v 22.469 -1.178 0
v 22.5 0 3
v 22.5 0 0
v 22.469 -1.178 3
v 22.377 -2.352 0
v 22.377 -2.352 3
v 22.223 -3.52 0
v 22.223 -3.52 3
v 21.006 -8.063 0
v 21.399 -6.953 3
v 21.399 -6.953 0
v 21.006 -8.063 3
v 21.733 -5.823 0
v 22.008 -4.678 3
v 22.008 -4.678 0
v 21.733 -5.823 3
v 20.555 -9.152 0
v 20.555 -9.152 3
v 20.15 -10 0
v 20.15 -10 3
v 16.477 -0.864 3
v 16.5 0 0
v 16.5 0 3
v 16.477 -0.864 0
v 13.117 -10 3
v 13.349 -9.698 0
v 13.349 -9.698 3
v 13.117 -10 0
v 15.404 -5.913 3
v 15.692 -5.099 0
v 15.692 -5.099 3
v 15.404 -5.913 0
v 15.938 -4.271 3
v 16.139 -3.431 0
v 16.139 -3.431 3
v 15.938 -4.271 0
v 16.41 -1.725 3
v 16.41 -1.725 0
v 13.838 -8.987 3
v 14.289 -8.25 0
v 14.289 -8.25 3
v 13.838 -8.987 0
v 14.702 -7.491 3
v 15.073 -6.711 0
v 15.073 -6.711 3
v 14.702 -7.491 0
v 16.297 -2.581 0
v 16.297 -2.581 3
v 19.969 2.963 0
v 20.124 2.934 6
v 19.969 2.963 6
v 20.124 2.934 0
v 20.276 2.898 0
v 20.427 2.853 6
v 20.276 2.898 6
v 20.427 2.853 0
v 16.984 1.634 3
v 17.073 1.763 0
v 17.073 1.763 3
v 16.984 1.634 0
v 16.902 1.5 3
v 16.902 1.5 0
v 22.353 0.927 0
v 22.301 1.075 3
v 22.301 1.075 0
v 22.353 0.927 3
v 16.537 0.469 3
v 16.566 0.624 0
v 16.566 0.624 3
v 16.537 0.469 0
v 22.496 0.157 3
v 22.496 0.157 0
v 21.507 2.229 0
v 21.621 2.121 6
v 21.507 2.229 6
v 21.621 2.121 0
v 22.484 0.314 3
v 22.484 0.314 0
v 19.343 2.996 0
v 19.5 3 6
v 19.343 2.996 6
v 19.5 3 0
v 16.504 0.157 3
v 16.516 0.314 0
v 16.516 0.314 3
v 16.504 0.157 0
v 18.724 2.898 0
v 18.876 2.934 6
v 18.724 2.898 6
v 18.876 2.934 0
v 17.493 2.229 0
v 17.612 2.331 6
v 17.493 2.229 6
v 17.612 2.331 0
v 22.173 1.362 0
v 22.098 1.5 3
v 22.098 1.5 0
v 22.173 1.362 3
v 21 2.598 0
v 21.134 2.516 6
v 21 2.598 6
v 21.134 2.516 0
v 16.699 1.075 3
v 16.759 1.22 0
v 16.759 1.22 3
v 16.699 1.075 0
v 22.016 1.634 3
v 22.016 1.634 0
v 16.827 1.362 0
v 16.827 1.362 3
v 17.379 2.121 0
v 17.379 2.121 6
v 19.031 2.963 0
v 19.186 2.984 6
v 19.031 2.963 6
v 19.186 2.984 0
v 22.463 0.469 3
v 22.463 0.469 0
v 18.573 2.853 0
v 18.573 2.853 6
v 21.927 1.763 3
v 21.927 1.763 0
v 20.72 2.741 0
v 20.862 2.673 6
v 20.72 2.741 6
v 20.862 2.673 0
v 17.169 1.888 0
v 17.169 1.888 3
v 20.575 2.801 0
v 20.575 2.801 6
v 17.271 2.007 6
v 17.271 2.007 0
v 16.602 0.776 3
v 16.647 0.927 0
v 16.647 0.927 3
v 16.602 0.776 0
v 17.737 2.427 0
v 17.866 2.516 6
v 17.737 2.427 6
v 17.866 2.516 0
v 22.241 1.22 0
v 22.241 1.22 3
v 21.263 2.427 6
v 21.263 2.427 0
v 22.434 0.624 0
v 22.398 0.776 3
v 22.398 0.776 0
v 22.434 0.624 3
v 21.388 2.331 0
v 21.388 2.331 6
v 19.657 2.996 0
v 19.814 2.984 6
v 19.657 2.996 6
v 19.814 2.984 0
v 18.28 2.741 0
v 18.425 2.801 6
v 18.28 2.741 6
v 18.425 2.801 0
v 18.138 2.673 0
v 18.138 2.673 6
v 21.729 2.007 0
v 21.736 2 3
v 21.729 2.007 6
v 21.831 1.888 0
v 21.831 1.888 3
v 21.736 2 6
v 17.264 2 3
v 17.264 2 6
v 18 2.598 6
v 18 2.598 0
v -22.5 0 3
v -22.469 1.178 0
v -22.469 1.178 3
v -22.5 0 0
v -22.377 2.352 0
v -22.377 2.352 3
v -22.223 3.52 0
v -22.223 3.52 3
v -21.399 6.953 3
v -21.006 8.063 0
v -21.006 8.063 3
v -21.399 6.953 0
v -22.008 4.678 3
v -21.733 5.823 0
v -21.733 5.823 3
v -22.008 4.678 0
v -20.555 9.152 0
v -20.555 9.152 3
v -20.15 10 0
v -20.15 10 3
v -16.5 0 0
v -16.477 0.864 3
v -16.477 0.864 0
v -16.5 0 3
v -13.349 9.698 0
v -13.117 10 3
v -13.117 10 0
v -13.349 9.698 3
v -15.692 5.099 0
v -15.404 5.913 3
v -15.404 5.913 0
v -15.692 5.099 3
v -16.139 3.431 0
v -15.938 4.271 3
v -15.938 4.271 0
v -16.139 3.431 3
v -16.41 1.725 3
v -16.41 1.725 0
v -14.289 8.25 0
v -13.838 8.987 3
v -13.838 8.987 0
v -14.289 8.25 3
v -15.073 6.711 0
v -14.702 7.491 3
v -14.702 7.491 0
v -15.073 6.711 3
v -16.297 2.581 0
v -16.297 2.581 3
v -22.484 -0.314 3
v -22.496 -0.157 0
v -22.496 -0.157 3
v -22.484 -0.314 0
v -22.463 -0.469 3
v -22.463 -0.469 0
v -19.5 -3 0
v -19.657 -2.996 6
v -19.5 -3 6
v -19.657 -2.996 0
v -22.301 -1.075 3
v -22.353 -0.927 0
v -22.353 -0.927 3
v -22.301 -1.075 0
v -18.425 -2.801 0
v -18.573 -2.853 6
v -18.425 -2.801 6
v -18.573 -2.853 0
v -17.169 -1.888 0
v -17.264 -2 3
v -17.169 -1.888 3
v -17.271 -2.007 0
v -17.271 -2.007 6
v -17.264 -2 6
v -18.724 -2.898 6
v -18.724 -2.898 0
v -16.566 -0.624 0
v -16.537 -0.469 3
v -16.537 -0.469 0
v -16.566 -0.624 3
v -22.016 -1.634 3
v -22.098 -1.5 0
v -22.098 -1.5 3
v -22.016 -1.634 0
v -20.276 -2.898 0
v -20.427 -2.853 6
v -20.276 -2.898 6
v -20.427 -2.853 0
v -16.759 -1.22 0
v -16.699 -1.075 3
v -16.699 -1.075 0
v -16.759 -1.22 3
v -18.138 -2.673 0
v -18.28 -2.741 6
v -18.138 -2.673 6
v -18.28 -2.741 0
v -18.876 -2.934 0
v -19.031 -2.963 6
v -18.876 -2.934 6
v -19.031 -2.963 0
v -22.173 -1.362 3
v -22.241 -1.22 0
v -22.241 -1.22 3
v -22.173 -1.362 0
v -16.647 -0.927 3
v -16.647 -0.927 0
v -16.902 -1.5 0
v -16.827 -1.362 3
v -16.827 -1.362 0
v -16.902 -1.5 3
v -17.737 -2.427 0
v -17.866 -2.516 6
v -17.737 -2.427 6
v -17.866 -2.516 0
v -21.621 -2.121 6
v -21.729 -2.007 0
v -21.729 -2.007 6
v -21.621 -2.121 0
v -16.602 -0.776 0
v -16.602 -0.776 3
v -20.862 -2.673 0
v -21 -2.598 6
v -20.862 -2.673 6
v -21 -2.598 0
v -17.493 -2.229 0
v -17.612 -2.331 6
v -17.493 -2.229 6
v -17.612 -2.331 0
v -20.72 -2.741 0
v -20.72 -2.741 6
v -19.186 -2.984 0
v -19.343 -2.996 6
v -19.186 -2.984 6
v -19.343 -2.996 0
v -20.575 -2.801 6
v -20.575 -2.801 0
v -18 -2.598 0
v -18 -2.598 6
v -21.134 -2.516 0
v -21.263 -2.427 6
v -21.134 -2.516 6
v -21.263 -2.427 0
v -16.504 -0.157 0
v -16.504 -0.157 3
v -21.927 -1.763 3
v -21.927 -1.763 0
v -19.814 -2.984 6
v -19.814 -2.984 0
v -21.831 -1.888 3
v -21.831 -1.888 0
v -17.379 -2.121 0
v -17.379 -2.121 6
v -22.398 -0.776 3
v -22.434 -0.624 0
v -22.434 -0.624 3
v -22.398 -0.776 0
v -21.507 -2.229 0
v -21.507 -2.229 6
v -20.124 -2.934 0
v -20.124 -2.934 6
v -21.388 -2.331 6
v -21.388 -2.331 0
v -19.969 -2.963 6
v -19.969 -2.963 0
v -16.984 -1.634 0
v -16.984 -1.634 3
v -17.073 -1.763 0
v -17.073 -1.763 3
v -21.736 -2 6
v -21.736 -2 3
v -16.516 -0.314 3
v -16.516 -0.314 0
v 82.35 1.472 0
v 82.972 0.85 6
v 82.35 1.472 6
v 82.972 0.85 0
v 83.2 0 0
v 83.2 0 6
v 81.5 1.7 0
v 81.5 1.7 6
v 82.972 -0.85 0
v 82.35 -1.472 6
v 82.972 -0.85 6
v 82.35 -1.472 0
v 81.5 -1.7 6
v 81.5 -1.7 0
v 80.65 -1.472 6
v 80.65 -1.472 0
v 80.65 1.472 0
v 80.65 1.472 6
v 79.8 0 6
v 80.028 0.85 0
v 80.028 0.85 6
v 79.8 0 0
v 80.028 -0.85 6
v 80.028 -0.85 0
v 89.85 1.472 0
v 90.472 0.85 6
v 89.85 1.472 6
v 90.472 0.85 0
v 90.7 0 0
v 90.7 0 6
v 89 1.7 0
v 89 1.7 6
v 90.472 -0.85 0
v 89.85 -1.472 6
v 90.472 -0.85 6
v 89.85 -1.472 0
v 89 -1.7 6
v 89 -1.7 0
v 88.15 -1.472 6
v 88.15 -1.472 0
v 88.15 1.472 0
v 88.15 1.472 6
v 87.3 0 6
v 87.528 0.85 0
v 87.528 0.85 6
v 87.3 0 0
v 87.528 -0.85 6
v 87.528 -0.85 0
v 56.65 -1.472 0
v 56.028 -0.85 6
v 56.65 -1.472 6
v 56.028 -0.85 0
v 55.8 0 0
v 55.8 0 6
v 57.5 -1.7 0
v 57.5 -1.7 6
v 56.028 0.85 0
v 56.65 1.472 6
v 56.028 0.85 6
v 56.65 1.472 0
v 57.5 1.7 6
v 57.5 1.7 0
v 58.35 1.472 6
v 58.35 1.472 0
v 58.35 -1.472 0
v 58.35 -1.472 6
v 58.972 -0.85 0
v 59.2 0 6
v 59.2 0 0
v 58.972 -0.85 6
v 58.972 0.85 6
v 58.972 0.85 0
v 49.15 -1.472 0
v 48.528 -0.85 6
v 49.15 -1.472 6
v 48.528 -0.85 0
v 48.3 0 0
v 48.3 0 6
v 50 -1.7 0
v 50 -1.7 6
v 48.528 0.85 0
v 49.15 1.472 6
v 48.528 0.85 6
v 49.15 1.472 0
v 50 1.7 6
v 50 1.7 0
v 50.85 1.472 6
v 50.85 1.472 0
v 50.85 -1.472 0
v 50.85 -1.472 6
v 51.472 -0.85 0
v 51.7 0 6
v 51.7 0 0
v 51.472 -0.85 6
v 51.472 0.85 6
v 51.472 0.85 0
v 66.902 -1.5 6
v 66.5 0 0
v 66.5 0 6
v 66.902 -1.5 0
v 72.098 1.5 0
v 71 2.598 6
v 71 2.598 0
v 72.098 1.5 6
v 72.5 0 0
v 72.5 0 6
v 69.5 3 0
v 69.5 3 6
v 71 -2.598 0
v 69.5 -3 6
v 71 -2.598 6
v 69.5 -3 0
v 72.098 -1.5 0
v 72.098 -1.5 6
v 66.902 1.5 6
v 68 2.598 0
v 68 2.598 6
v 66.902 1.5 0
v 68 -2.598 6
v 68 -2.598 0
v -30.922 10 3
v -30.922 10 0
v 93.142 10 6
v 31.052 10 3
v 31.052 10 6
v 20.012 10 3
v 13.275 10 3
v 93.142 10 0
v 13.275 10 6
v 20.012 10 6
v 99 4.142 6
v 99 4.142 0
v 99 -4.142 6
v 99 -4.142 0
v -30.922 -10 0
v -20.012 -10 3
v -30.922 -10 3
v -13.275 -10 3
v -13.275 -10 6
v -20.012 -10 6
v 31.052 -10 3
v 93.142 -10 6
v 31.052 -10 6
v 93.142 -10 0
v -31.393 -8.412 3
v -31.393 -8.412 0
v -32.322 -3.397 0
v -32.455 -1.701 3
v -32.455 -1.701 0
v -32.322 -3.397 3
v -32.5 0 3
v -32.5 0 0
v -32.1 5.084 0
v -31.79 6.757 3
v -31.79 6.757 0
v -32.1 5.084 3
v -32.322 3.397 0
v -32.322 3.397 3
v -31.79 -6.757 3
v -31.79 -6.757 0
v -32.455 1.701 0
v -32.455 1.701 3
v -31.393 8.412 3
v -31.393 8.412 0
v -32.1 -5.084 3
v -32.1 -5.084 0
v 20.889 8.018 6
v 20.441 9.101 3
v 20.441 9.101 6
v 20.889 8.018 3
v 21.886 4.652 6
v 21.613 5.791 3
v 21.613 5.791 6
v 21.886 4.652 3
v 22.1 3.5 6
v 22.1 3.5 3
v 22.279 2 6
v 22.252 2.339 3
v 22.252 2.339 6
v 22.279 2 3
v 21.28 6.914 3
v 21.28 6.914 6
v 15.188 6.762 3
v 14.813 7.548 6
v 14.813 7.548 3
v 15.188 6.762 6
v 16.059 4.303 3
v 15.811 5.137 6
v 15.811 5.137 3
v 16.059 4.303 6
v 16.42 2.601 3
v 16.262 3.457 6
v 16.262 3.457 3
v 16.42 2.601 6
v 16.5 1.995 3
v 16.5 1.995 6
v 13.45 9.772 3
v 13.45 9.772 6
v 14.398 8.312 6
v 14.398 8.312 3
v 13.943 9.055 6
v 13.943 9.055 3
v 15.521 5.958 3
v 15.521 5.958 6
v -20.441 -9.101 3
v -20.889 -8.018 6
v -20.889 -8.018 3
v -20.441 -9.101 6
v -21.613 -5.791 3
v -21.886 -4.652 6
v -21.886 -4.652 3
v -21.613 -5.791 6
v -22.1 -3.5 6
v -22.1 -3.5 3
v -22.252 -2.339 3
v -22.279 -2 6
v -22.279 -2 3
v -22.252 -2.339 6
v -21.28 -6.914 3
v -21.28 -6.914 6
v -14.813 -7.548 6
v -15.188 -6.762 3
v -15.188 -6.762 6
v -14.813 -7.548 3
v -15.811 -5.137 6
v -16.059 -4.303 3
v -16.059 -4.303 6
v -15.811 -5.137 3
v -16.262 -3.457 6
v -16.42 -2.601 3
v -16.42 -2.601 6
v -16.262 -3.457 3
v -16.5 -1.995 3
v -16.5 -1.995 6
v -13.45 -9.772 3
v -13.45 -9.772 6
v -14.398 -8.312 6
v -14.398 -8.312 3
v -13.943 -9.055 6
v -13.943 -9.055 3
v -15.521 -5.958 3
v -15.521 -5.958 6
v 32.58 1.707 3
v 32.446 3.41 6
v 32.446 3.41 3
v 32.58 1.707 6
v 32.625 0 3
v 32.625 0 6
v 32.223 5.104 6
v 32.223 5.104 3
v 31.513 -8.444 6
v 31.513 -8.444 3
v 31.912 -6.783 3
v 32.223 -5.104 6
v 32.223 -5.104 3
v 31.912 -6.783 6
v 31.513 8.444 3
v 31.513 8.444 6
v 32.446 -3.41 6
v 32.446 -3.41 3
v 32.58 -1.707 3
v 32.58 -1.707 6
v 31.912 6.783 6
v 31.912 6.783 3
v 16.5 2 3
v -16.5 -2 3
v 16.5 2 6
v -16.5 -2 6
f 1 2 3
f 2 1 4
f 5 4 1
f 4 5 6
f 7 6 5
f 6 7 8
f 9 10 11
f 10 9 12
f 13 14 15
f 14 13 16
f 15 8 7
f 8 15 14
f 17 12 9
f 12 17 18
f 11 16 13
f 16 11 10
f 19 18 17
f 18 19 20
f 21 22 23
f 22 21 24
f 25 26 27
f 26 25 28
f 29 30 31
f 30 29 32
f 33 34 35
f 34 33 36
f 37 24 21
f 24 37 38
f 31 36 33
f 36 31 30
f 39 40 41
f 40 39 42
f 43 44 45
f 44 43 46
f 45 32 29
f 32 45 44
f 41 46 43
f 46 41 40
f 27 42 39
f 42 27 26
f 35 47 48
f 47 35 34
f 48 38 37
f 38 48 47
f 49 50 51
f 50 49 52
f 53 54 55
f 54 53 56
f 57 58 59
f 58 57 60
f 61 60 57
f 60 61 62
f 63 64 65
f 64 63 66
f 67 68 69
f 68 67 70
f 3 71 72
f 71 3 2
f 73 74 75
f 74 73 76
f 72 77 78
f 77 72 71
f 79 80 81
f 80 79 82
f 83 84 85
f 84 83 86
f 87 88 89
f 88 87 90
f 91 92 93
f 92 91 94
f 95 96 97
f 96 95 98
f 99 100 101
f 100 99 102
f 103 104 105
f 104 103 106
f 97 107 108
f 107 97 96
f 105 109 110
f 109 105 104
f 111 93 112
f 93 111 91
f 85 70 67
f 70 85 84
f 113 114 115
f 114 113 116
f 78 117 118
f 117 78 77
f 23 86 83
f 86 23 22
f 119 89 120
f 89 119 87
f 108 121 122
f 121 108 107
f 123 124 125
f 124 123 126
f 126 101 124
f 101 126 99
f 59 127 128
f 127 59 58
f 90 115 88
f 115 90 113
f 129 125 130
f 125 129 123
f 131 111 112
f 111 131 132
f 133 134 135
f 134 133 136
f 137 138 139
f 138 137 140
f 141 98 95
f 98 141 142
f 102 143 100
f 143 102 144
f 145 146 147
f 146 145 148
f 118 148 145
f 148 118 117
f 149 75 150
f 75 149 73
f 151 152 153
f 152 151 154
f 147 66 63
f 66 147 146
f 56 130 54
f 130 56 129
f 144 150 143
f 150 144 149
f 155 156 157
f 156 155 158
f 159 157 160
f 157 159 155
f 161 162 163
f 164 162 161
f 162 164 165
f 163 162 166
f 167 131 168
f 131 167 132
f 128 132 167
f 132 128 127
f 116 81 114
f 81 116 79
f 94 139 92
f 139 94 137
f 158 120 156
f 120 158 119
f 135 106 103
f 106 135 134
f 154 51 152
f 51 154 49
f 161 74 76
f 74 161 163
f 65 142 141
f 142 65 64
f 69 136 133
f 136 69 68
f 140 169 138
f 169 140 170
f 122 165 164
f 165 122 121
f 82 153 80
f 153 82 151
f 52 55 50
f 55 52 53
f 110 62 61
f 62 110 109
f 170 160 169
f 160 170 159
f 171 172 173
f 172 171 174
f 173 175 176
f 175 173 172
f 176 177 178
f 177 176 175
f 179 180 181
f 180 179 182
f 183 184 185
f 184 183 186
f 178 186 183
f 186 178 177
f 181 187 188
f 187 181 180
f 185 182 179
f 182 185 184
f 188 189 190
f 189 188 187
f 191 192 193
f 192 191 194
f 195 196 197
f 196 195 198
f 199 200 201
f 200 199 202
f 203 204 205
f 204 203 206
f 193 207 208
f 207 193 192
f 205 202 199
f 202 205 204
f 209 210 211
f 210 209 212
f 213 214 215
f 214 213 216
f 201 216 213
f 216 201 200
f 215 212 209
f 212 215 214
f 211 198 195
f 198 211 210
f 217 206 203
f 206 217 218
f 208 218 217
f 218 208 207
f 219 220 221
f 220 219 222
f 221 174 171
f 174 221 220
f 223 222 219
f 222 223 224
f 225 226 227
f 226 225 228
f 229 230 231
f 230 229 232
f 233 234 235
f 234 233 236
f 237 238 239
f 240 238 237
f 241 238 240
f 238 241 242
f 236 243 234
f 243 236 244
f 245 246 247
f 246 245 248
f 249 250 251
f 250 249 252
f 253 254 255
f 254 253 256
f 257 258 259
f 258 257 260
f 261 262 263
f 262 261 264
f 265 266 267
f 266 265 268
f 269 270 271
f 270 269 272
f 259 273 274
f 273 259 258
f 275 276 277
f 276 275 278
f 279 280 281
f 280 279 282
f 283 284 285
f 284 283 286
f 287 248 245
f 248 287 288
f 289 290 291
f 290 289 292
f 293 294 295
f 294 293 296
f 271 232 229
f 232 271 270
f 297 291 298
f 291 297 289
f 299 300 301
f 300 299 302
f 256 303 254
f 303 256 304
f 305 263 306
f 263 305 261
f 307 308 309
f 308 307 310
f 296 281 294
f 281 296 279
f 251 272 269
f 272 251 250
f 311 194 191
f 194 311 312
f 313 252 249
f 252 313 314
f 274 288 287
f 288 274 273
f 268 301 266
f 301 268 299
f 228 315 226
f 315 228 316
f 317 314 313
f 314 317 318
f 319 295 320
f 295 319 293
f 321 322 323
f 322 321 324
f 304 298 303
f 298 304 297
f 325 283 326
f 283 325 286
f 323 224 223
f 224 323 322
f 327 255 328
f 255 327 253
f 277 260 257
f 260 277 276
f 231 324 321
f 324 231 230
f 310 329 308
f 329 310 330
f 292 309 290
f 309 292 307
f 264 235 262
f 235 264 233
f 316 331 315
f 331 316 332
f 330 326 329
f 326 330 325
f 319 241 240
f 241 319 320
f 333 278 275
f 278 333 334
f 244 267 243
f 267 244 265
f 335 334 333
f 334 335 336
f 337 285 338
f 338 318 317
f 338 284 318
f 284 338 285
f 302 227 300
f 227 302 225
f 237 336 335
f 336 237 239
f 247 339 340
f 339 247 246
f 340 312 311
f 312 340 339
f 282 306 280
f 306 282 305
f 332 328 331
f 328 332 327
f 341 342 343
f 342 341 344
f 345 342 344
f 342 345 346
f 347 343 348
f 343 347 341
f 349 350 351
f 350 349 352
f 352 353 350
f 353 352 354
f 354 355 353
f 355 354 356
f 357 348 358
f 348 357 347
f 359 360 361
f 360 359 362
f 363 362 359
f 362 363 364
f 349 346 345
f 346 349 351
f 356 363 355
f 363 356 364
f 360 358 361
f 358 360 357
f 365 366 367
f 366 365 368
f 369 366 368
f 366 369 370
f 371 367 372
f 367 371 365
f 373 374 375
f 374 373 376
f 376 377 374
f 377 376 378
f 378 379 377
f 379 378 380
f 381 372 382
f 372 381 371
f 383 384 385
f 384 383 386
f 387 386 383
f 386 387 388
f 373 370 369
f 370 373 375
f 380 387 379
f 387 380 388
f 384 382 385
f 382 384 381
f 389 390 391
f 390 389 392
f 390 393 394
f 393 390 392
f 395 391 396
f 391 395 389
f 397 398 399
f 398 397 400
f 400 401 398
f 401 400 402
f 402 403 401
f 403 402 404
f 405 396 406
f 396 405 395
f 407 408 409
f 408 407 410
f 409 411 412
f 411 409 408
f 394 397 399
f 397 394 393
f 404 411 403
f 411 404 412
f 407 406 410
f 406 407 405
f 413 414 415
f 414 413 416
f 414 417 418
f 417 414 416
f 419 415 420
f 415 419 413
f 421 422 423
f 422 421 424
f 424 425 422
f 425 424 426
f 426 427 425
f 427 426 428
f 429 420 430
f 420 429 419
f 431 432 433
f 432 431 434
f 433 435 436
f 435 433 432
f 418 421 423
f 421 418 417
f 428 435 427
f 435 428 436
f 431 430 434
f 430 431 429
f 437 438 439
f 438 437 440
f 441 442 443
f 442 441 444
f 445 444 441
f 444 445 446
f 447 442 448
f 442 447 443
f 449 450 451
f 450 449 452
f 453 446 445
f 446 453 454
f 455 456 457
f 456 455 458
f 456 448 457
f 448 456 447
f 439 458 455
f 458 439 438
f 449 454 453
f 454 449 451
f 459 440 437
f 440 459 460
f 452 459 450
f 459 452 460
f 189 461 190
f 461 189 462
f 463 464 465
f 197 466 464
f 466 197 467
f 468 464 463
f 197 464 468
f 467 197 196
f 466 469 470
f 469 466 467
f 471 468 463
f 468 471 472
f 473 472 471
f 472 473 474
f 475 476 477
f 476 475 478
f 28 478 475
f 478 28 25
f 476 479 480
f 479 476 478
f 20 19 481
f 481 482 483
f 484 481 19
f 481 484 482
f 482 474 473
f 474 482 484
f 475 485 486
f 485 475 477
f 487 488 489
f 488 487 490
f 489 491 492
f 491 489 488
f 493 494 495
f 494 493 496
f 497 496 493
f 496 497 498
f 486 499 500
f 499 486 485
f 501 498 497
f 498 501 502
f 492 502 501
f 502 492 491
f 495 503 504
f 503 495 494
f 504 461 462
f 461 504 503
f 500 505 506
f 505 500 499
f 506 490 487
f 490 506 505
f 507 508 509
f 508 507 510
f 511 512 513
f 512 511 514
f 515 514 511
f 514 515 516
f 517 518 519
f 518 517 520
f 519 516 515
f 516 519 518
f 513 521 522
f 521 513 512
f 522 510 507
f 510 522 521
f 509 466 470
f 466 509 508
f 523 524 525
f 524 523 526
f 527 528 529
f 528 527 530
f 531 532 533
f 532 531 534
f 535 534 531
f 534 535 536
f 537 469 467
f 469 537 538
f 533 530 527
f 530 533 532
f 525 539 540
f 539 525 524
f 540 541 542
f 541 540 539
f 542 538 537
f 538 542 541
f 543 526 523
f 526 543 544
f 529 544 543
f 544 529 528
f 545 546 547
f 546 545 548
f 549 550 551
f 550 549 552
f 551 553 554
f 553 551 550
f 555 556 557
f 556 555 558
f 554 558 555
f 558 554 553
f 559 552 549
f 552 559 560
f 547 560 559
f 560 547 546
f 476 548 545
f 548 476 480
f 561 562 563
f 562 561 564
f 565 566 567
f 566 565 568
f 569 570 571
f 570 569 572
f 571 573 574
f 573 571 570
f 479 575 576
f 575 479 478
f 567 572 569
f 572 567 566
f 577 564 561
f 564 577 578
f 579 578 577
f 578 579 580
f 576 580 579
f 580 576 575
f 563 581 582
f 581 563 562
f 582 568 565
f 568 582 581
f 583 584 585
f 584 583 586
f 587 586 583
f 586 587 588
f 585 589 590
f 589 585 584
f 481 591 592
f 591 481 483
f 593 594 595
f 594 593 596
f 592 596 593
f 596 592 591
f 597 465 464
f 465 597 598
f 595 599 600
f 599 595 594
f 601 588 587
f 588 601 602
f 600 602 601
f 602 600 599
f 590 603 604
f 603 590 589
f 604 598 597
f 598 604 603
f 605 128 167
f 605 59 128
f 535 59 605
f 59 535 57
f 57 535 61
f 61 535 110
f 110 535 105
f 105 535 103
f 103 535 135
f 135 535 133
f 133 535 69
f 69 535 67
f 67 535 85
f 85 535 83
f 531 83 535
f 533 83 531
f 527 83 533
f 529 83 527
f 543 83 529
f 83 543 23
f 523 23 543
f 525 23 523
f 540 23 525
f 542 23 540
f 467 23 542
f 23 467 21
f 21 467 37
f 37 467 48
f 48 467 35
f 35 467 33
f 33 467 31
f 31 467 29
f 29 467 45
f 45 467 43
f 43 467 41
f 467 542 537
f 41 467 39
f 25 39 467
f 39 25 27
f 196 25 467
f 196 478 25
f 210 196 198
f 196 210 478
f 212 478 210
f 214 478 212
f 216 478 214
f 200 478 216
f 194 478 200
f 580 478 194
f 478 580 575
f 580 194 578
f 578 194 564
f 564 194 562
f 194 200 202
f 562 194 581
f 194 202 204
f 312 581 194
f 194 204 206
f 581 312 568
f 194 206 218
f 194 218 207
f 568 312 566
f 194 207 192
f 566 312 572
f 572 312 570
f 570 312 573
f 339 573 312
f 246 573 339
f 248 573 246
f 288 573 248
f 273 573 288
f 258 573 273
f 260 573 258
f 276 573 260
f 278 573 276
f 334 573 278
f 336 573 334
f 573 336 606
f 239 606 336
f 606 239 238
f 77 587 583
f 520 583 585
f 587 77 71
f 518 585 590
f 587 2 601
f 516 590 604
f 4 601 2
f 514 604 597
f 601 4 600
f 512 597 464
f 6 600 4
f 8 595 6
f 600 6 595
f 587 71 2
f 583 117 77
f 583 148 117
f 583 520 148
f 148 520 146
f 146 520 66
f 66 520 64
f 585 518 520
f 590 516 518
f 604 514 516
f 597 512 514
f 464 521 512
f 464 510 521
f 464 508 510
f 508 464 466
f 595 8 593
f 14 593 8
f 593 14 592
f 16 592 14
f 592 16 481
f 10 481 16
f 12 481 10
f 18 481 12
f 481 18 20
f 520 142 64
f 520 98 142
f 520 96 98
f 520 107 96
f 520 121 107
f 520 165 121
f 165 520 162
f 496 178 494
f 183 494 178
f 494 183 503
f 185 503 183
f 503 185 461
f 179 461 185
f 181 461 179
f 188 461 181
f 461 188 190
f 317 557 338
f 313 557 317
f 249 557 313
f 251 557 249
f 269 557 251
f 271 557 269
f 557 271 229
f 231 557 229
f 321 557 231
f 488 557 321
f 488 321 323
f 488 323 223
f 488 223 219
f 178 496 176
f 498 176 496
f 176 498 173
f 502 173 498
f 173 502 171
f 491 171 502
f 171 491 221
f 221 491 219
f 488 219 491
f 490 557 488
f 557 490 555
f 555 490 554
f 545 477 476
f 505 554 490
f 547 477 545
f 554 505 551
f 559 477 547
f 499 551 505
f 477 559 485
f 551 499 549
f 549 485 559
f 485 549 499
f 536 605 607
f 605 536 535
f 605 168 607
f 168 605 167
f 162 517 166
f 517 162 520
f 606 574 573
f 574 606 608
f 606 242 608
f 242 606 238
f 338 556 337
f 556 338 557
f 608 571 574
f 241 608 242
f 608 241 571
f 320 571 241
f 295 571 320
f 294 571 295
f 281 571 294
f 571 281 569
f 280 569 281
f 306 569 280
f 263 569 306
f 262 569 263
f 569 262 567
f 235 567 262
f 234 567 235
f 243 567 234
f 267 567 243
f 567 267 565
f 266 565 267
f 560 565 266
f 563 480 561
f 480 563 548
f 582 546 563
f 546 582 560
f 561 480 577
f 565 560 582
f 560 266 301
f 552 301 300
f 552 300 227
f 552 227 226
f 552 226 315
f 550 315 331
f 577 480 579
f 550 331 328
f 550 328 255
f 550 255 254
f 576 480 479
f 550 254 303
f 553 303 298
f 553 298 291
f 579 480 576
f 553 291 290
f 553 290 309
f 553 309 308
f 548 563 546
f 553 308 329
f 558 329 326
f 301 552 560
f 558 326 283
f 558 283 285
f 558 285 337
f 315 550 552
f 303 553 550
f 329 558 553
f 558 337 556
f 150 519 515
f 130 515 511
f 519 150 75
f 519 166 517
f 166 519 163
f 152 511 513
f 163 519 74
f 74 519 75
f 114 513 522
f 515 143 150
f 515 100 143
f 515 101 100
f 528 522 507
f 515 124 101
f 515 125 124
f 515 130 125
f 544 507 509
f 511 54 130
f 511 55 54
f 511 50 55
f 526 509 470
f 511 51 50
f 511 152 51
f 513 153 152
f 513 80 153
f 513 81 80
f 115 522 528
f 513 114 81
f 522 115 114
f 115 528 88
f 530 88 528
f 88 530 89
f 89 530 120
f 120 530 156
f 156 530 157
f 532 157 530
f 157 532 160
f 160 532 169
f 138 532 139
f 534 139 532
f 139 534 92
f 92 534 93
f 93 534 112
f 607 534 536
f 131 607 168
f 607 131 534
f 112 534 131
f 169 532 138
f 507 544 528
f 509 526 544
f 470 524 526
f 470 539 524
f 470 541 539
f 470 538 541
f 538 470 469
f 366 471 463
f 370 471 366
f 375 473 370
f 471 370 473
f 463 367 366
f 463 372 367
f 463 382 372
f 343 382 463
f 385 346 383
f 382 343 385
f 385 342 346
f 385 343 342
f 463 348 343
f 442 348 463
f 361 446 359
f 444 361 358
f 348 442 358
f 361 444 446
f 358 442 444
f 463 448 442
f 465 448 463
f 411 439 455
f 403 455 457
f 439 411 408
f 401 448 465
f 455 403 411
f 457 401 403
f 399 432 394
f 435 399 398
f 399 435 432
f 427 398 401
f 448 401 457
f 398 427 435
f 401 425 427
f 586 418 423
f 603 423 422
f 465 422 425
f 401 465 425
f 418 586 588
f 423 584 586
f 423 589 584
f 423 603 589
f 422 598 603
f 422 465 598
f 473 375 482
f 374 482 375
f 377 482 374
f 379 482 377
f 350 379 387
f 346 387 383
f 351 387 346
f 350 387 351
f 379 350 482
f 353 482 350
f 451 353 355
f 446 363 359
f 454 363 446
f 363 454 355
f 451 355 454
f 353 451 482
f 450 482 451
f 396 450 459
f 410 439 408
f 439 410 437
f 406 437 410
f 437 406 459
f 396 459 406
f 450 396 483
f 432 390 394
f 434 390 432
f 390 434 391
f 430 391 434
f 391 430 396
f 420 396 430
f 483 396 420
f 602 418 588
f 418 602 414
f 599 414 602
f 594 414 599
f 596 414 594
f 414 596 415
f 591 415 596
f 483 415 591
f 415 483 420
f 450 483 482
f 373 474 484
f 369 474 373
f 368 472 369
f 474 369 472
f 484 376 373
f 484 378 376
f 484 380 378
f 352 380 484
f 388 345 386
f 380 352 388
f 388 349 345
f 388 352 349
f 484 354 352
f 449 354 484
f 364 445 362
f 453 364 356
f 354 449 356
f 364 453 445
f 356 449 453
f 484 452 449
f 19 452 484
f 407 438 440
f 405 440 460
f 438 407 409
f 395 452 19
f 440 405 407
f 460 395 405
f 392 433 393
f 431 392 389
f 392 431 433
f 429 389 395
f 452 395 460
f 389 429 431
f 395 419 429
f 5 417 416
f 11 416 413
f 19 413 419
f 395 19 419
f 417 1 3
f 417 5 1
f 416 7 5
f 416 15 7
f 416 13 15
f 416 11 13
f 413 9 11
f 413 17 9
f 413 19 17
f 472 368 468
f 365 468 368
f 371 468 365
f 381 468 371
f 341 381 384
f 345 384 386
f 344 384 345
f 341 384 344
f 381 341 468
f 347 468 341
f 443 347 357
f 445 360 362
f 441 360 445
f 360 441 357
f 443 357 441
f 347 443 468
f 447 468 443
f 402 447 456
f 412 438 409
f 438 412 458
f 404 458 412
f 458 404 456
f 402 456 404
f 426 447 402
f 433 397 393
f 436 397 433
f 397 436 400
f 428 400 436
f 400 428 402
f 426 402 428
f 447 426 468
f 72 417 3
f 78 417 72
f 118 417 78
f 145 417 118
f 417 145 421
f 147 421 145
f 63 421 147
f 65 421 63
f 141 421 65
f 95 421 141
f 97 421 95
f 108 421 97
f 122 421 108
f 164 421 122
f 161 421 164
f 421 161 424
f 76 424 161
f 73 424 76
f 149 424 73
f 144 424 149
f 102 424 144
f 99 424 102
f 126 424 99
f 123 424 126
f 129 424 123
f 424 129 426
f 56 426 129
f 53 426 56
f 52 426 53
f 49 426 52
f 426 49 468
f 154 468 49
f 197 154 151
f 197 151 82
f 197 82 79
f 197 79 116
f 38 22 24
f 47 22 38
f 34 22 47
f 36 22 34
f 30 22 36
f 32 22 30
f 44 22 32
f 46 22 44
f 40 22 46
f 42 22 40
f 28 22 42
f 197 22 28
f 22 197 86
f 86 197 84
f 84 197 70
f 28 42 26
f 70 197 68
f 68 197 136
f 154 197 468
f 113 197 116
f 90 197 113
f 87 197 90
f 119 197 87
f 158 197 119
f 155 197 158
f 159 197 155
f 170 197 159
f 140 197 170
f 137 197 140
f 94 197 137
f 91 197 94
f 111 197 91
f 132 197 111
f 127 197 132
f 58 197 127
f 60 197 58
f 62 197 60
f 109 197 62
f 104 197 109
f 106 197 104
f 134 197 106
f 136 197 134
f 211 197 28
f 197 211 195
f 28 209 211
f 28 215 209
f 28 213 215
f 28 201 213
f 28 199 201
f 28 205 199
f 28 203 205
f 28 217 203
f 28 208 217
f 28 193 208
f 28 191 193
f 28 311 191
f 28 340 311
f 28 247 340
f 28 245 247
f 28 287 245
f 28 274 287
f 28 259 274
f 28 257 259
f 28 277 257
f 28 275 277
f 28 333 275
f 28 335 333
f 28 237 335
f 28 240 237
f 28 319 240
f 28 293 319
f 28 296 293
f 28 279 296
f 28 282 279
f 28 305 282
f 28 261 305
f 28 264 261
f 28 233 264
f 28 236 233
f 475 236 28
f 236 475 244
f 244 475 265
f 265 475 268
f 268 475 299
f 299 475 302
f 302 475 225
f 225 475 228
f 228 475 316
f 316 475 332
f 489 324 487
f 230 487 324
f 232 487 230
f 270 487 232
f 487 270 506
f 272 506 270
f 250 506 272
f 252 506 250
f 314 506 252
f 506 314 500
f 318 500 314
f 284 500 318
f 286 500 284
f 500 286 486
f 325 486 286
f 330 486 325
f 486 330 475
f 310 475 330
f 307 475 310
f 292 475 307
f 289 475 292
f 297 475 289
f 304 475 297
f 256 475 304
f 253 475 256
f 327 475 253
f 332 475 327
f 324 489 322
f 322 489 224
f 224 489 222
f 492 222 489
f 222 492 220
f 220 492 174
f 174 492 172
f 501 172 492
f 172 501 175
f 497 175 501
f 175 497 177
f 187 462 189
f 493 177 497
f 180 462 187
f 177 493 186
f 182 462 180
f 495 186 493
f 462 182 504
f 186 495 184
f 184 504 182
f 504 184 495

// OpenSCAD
/*
 * Mount plate for NMEA14 version of extruder.
 *      Version 2015-05-11
 *
 * Copyright (C) 2015 Mikhail Basov <RepRap[at]Basov[dot]net>
 *
 * This program is free software; you can redistribute it and/or modify
 * it under the terms of the GNU General Public License as published by
 * the Free Software Foundation; either version 3 of the License,
 * LGPL version 2.1, or (at your option) any later version of the GPL.
 *
 * This program is distributed in the hope that it will be useful,
 * but WITHOUT ANY WARRANTY; without even the implied warranty of
 * MERCHANTABILITY or FITNESS FOR A PARTICULAR PURPOSE. See the
 * GNU General Public License for more details.
 *
 * You should have received a copy of the GNU General Public License
 * along with this program; if not, write to the Free Software
 * Foundation, Inc., 59 Temple Place, Suite 330, Boston, MA 02111-1307 USA
 *
 *              2015. License, GPL v2 or later
 */
/* Start of customizer header */

/* [Model parameters] */

Print_dual=1;//[1:true,0:false]

// [mm]
Rods_diameter=6;

// [mm]
Top_rods_distance=39;

// [mm]
Wide=20;

// [mm]
Thicknes=6;

// [mm] (Ususaly, Wide/2+19.5+50+Top_road_distance+Wide)
Length=138.5;

/* [Print parameters] */

// [mm]
Tolerance=0.25;

/* [Hidden] */

r=Rods_diameter; // rod diameter
rd=Top_rods_distance; // top rod distance
w=Wide;  // mount plate wide
l=Length; //mount plate length
t=Thicknes; // mount plate thicknes
tol=Tolerance; //assemble tollerance
M3=3.4;

dual=Print_dual; // false - mount for only one extruder

k8=1+sqrt(2);
ro8=sqrt(k8/(k8-1))/k8;

module ext_edge_cuter(){
    difference(){
        translate([0,-w/2-0.1,0])
            cube([w+0.1,w+0.2,t+0.2]);
        translate([0,0,-0.2])
            rotate([0,0,22.5])
                cylinder(r=w*ro8,h=t+0.6,$fn=8);
    }
}

module int_edge_cuter(){
    rotate([0,0,180])
    difference(){
        translate([rd/2,-w/2-0.1,0])
            cube([w+0.1,w+0.2,t+0.2]);
        translate([0,0,0.1])
            cylinder(r=(rd+r+w)/2,h=t+0.2,$fn=120);
    }
}

module assemble_halfs(){
        translate(t/2)
            cylinder(r=(rd+r+w+tol)/2,h=t/2+0.1,$fn=120);
}

module extruder_mount_cuter(){
    $fn=12;
    cylinder(r=6/2,h=t+0.2);
    for(i=[0,180]){
        rotate([0,0,i]){
            translate([12,0,0])
                cylinder(r=M3/2,h=t+0.2);
            translate([19.5,0,0])
                cylinder(r=M3/2,h=t+0.2);
        }
    }
}

module rods_mount_cuter(atol=0){
    // atol - tolerance
    for(i=[0,180]){
        rotate([0,0,i]){
            translate([rd/2,0,-0.1])
                cylinder(r=(r+atol)/2, h=t+0.2, $fn=120);
            intersection(){
                translate([0,-(w/2+0.2),-0.2])
                    cube([rd/2+r/2+0.2,w/2+0.2,t+0.4]);
                difference(){
                    translate([0,0,-0.2])
                        cylinder(r=rd/2+r/2+atol/2,h=t+0.4,$fn=120);
                    translate([0,0,-0.4])
                        cylinder(r=rd/2-r/2-atol/2,h=t+0.8,$fn=120);
                }
            }
        }
    }
}

difference(){
    // main plate body
    translate([-1*(w+rd/2),-1*w/2,0])
        cube([l,w,t]);
    
    // rods mount holes
    rods_mount_cuter();
    
    // extruder mount holes
    translate([rd/2+50,0,-0.1])
        extruder_mount_cuter();
    
    // external edge cuter
    translate([rd/2+50+19.5,0,-0.1])
        ext_edge_cuter();

    // internal edge cuter
    translate([0,0,-0.1])
        int_edge_cuter();
    
    if(dual){
        translate([0,0,t/2])
            difference(){
                assemble_halfs();
                rotate([180,0,0])
                    translate([0,0,-t])
                        rods_mount_cuter(atol=-1*tol);
            }
        
        // remove sharp edges
        for(i=[0,180]){
            rotate([0,0,i]){
                translate([rd/2-r/2,-r/2-r/6,t/2])
                    cube([r,r,t]);
            }
        }
    }
}
